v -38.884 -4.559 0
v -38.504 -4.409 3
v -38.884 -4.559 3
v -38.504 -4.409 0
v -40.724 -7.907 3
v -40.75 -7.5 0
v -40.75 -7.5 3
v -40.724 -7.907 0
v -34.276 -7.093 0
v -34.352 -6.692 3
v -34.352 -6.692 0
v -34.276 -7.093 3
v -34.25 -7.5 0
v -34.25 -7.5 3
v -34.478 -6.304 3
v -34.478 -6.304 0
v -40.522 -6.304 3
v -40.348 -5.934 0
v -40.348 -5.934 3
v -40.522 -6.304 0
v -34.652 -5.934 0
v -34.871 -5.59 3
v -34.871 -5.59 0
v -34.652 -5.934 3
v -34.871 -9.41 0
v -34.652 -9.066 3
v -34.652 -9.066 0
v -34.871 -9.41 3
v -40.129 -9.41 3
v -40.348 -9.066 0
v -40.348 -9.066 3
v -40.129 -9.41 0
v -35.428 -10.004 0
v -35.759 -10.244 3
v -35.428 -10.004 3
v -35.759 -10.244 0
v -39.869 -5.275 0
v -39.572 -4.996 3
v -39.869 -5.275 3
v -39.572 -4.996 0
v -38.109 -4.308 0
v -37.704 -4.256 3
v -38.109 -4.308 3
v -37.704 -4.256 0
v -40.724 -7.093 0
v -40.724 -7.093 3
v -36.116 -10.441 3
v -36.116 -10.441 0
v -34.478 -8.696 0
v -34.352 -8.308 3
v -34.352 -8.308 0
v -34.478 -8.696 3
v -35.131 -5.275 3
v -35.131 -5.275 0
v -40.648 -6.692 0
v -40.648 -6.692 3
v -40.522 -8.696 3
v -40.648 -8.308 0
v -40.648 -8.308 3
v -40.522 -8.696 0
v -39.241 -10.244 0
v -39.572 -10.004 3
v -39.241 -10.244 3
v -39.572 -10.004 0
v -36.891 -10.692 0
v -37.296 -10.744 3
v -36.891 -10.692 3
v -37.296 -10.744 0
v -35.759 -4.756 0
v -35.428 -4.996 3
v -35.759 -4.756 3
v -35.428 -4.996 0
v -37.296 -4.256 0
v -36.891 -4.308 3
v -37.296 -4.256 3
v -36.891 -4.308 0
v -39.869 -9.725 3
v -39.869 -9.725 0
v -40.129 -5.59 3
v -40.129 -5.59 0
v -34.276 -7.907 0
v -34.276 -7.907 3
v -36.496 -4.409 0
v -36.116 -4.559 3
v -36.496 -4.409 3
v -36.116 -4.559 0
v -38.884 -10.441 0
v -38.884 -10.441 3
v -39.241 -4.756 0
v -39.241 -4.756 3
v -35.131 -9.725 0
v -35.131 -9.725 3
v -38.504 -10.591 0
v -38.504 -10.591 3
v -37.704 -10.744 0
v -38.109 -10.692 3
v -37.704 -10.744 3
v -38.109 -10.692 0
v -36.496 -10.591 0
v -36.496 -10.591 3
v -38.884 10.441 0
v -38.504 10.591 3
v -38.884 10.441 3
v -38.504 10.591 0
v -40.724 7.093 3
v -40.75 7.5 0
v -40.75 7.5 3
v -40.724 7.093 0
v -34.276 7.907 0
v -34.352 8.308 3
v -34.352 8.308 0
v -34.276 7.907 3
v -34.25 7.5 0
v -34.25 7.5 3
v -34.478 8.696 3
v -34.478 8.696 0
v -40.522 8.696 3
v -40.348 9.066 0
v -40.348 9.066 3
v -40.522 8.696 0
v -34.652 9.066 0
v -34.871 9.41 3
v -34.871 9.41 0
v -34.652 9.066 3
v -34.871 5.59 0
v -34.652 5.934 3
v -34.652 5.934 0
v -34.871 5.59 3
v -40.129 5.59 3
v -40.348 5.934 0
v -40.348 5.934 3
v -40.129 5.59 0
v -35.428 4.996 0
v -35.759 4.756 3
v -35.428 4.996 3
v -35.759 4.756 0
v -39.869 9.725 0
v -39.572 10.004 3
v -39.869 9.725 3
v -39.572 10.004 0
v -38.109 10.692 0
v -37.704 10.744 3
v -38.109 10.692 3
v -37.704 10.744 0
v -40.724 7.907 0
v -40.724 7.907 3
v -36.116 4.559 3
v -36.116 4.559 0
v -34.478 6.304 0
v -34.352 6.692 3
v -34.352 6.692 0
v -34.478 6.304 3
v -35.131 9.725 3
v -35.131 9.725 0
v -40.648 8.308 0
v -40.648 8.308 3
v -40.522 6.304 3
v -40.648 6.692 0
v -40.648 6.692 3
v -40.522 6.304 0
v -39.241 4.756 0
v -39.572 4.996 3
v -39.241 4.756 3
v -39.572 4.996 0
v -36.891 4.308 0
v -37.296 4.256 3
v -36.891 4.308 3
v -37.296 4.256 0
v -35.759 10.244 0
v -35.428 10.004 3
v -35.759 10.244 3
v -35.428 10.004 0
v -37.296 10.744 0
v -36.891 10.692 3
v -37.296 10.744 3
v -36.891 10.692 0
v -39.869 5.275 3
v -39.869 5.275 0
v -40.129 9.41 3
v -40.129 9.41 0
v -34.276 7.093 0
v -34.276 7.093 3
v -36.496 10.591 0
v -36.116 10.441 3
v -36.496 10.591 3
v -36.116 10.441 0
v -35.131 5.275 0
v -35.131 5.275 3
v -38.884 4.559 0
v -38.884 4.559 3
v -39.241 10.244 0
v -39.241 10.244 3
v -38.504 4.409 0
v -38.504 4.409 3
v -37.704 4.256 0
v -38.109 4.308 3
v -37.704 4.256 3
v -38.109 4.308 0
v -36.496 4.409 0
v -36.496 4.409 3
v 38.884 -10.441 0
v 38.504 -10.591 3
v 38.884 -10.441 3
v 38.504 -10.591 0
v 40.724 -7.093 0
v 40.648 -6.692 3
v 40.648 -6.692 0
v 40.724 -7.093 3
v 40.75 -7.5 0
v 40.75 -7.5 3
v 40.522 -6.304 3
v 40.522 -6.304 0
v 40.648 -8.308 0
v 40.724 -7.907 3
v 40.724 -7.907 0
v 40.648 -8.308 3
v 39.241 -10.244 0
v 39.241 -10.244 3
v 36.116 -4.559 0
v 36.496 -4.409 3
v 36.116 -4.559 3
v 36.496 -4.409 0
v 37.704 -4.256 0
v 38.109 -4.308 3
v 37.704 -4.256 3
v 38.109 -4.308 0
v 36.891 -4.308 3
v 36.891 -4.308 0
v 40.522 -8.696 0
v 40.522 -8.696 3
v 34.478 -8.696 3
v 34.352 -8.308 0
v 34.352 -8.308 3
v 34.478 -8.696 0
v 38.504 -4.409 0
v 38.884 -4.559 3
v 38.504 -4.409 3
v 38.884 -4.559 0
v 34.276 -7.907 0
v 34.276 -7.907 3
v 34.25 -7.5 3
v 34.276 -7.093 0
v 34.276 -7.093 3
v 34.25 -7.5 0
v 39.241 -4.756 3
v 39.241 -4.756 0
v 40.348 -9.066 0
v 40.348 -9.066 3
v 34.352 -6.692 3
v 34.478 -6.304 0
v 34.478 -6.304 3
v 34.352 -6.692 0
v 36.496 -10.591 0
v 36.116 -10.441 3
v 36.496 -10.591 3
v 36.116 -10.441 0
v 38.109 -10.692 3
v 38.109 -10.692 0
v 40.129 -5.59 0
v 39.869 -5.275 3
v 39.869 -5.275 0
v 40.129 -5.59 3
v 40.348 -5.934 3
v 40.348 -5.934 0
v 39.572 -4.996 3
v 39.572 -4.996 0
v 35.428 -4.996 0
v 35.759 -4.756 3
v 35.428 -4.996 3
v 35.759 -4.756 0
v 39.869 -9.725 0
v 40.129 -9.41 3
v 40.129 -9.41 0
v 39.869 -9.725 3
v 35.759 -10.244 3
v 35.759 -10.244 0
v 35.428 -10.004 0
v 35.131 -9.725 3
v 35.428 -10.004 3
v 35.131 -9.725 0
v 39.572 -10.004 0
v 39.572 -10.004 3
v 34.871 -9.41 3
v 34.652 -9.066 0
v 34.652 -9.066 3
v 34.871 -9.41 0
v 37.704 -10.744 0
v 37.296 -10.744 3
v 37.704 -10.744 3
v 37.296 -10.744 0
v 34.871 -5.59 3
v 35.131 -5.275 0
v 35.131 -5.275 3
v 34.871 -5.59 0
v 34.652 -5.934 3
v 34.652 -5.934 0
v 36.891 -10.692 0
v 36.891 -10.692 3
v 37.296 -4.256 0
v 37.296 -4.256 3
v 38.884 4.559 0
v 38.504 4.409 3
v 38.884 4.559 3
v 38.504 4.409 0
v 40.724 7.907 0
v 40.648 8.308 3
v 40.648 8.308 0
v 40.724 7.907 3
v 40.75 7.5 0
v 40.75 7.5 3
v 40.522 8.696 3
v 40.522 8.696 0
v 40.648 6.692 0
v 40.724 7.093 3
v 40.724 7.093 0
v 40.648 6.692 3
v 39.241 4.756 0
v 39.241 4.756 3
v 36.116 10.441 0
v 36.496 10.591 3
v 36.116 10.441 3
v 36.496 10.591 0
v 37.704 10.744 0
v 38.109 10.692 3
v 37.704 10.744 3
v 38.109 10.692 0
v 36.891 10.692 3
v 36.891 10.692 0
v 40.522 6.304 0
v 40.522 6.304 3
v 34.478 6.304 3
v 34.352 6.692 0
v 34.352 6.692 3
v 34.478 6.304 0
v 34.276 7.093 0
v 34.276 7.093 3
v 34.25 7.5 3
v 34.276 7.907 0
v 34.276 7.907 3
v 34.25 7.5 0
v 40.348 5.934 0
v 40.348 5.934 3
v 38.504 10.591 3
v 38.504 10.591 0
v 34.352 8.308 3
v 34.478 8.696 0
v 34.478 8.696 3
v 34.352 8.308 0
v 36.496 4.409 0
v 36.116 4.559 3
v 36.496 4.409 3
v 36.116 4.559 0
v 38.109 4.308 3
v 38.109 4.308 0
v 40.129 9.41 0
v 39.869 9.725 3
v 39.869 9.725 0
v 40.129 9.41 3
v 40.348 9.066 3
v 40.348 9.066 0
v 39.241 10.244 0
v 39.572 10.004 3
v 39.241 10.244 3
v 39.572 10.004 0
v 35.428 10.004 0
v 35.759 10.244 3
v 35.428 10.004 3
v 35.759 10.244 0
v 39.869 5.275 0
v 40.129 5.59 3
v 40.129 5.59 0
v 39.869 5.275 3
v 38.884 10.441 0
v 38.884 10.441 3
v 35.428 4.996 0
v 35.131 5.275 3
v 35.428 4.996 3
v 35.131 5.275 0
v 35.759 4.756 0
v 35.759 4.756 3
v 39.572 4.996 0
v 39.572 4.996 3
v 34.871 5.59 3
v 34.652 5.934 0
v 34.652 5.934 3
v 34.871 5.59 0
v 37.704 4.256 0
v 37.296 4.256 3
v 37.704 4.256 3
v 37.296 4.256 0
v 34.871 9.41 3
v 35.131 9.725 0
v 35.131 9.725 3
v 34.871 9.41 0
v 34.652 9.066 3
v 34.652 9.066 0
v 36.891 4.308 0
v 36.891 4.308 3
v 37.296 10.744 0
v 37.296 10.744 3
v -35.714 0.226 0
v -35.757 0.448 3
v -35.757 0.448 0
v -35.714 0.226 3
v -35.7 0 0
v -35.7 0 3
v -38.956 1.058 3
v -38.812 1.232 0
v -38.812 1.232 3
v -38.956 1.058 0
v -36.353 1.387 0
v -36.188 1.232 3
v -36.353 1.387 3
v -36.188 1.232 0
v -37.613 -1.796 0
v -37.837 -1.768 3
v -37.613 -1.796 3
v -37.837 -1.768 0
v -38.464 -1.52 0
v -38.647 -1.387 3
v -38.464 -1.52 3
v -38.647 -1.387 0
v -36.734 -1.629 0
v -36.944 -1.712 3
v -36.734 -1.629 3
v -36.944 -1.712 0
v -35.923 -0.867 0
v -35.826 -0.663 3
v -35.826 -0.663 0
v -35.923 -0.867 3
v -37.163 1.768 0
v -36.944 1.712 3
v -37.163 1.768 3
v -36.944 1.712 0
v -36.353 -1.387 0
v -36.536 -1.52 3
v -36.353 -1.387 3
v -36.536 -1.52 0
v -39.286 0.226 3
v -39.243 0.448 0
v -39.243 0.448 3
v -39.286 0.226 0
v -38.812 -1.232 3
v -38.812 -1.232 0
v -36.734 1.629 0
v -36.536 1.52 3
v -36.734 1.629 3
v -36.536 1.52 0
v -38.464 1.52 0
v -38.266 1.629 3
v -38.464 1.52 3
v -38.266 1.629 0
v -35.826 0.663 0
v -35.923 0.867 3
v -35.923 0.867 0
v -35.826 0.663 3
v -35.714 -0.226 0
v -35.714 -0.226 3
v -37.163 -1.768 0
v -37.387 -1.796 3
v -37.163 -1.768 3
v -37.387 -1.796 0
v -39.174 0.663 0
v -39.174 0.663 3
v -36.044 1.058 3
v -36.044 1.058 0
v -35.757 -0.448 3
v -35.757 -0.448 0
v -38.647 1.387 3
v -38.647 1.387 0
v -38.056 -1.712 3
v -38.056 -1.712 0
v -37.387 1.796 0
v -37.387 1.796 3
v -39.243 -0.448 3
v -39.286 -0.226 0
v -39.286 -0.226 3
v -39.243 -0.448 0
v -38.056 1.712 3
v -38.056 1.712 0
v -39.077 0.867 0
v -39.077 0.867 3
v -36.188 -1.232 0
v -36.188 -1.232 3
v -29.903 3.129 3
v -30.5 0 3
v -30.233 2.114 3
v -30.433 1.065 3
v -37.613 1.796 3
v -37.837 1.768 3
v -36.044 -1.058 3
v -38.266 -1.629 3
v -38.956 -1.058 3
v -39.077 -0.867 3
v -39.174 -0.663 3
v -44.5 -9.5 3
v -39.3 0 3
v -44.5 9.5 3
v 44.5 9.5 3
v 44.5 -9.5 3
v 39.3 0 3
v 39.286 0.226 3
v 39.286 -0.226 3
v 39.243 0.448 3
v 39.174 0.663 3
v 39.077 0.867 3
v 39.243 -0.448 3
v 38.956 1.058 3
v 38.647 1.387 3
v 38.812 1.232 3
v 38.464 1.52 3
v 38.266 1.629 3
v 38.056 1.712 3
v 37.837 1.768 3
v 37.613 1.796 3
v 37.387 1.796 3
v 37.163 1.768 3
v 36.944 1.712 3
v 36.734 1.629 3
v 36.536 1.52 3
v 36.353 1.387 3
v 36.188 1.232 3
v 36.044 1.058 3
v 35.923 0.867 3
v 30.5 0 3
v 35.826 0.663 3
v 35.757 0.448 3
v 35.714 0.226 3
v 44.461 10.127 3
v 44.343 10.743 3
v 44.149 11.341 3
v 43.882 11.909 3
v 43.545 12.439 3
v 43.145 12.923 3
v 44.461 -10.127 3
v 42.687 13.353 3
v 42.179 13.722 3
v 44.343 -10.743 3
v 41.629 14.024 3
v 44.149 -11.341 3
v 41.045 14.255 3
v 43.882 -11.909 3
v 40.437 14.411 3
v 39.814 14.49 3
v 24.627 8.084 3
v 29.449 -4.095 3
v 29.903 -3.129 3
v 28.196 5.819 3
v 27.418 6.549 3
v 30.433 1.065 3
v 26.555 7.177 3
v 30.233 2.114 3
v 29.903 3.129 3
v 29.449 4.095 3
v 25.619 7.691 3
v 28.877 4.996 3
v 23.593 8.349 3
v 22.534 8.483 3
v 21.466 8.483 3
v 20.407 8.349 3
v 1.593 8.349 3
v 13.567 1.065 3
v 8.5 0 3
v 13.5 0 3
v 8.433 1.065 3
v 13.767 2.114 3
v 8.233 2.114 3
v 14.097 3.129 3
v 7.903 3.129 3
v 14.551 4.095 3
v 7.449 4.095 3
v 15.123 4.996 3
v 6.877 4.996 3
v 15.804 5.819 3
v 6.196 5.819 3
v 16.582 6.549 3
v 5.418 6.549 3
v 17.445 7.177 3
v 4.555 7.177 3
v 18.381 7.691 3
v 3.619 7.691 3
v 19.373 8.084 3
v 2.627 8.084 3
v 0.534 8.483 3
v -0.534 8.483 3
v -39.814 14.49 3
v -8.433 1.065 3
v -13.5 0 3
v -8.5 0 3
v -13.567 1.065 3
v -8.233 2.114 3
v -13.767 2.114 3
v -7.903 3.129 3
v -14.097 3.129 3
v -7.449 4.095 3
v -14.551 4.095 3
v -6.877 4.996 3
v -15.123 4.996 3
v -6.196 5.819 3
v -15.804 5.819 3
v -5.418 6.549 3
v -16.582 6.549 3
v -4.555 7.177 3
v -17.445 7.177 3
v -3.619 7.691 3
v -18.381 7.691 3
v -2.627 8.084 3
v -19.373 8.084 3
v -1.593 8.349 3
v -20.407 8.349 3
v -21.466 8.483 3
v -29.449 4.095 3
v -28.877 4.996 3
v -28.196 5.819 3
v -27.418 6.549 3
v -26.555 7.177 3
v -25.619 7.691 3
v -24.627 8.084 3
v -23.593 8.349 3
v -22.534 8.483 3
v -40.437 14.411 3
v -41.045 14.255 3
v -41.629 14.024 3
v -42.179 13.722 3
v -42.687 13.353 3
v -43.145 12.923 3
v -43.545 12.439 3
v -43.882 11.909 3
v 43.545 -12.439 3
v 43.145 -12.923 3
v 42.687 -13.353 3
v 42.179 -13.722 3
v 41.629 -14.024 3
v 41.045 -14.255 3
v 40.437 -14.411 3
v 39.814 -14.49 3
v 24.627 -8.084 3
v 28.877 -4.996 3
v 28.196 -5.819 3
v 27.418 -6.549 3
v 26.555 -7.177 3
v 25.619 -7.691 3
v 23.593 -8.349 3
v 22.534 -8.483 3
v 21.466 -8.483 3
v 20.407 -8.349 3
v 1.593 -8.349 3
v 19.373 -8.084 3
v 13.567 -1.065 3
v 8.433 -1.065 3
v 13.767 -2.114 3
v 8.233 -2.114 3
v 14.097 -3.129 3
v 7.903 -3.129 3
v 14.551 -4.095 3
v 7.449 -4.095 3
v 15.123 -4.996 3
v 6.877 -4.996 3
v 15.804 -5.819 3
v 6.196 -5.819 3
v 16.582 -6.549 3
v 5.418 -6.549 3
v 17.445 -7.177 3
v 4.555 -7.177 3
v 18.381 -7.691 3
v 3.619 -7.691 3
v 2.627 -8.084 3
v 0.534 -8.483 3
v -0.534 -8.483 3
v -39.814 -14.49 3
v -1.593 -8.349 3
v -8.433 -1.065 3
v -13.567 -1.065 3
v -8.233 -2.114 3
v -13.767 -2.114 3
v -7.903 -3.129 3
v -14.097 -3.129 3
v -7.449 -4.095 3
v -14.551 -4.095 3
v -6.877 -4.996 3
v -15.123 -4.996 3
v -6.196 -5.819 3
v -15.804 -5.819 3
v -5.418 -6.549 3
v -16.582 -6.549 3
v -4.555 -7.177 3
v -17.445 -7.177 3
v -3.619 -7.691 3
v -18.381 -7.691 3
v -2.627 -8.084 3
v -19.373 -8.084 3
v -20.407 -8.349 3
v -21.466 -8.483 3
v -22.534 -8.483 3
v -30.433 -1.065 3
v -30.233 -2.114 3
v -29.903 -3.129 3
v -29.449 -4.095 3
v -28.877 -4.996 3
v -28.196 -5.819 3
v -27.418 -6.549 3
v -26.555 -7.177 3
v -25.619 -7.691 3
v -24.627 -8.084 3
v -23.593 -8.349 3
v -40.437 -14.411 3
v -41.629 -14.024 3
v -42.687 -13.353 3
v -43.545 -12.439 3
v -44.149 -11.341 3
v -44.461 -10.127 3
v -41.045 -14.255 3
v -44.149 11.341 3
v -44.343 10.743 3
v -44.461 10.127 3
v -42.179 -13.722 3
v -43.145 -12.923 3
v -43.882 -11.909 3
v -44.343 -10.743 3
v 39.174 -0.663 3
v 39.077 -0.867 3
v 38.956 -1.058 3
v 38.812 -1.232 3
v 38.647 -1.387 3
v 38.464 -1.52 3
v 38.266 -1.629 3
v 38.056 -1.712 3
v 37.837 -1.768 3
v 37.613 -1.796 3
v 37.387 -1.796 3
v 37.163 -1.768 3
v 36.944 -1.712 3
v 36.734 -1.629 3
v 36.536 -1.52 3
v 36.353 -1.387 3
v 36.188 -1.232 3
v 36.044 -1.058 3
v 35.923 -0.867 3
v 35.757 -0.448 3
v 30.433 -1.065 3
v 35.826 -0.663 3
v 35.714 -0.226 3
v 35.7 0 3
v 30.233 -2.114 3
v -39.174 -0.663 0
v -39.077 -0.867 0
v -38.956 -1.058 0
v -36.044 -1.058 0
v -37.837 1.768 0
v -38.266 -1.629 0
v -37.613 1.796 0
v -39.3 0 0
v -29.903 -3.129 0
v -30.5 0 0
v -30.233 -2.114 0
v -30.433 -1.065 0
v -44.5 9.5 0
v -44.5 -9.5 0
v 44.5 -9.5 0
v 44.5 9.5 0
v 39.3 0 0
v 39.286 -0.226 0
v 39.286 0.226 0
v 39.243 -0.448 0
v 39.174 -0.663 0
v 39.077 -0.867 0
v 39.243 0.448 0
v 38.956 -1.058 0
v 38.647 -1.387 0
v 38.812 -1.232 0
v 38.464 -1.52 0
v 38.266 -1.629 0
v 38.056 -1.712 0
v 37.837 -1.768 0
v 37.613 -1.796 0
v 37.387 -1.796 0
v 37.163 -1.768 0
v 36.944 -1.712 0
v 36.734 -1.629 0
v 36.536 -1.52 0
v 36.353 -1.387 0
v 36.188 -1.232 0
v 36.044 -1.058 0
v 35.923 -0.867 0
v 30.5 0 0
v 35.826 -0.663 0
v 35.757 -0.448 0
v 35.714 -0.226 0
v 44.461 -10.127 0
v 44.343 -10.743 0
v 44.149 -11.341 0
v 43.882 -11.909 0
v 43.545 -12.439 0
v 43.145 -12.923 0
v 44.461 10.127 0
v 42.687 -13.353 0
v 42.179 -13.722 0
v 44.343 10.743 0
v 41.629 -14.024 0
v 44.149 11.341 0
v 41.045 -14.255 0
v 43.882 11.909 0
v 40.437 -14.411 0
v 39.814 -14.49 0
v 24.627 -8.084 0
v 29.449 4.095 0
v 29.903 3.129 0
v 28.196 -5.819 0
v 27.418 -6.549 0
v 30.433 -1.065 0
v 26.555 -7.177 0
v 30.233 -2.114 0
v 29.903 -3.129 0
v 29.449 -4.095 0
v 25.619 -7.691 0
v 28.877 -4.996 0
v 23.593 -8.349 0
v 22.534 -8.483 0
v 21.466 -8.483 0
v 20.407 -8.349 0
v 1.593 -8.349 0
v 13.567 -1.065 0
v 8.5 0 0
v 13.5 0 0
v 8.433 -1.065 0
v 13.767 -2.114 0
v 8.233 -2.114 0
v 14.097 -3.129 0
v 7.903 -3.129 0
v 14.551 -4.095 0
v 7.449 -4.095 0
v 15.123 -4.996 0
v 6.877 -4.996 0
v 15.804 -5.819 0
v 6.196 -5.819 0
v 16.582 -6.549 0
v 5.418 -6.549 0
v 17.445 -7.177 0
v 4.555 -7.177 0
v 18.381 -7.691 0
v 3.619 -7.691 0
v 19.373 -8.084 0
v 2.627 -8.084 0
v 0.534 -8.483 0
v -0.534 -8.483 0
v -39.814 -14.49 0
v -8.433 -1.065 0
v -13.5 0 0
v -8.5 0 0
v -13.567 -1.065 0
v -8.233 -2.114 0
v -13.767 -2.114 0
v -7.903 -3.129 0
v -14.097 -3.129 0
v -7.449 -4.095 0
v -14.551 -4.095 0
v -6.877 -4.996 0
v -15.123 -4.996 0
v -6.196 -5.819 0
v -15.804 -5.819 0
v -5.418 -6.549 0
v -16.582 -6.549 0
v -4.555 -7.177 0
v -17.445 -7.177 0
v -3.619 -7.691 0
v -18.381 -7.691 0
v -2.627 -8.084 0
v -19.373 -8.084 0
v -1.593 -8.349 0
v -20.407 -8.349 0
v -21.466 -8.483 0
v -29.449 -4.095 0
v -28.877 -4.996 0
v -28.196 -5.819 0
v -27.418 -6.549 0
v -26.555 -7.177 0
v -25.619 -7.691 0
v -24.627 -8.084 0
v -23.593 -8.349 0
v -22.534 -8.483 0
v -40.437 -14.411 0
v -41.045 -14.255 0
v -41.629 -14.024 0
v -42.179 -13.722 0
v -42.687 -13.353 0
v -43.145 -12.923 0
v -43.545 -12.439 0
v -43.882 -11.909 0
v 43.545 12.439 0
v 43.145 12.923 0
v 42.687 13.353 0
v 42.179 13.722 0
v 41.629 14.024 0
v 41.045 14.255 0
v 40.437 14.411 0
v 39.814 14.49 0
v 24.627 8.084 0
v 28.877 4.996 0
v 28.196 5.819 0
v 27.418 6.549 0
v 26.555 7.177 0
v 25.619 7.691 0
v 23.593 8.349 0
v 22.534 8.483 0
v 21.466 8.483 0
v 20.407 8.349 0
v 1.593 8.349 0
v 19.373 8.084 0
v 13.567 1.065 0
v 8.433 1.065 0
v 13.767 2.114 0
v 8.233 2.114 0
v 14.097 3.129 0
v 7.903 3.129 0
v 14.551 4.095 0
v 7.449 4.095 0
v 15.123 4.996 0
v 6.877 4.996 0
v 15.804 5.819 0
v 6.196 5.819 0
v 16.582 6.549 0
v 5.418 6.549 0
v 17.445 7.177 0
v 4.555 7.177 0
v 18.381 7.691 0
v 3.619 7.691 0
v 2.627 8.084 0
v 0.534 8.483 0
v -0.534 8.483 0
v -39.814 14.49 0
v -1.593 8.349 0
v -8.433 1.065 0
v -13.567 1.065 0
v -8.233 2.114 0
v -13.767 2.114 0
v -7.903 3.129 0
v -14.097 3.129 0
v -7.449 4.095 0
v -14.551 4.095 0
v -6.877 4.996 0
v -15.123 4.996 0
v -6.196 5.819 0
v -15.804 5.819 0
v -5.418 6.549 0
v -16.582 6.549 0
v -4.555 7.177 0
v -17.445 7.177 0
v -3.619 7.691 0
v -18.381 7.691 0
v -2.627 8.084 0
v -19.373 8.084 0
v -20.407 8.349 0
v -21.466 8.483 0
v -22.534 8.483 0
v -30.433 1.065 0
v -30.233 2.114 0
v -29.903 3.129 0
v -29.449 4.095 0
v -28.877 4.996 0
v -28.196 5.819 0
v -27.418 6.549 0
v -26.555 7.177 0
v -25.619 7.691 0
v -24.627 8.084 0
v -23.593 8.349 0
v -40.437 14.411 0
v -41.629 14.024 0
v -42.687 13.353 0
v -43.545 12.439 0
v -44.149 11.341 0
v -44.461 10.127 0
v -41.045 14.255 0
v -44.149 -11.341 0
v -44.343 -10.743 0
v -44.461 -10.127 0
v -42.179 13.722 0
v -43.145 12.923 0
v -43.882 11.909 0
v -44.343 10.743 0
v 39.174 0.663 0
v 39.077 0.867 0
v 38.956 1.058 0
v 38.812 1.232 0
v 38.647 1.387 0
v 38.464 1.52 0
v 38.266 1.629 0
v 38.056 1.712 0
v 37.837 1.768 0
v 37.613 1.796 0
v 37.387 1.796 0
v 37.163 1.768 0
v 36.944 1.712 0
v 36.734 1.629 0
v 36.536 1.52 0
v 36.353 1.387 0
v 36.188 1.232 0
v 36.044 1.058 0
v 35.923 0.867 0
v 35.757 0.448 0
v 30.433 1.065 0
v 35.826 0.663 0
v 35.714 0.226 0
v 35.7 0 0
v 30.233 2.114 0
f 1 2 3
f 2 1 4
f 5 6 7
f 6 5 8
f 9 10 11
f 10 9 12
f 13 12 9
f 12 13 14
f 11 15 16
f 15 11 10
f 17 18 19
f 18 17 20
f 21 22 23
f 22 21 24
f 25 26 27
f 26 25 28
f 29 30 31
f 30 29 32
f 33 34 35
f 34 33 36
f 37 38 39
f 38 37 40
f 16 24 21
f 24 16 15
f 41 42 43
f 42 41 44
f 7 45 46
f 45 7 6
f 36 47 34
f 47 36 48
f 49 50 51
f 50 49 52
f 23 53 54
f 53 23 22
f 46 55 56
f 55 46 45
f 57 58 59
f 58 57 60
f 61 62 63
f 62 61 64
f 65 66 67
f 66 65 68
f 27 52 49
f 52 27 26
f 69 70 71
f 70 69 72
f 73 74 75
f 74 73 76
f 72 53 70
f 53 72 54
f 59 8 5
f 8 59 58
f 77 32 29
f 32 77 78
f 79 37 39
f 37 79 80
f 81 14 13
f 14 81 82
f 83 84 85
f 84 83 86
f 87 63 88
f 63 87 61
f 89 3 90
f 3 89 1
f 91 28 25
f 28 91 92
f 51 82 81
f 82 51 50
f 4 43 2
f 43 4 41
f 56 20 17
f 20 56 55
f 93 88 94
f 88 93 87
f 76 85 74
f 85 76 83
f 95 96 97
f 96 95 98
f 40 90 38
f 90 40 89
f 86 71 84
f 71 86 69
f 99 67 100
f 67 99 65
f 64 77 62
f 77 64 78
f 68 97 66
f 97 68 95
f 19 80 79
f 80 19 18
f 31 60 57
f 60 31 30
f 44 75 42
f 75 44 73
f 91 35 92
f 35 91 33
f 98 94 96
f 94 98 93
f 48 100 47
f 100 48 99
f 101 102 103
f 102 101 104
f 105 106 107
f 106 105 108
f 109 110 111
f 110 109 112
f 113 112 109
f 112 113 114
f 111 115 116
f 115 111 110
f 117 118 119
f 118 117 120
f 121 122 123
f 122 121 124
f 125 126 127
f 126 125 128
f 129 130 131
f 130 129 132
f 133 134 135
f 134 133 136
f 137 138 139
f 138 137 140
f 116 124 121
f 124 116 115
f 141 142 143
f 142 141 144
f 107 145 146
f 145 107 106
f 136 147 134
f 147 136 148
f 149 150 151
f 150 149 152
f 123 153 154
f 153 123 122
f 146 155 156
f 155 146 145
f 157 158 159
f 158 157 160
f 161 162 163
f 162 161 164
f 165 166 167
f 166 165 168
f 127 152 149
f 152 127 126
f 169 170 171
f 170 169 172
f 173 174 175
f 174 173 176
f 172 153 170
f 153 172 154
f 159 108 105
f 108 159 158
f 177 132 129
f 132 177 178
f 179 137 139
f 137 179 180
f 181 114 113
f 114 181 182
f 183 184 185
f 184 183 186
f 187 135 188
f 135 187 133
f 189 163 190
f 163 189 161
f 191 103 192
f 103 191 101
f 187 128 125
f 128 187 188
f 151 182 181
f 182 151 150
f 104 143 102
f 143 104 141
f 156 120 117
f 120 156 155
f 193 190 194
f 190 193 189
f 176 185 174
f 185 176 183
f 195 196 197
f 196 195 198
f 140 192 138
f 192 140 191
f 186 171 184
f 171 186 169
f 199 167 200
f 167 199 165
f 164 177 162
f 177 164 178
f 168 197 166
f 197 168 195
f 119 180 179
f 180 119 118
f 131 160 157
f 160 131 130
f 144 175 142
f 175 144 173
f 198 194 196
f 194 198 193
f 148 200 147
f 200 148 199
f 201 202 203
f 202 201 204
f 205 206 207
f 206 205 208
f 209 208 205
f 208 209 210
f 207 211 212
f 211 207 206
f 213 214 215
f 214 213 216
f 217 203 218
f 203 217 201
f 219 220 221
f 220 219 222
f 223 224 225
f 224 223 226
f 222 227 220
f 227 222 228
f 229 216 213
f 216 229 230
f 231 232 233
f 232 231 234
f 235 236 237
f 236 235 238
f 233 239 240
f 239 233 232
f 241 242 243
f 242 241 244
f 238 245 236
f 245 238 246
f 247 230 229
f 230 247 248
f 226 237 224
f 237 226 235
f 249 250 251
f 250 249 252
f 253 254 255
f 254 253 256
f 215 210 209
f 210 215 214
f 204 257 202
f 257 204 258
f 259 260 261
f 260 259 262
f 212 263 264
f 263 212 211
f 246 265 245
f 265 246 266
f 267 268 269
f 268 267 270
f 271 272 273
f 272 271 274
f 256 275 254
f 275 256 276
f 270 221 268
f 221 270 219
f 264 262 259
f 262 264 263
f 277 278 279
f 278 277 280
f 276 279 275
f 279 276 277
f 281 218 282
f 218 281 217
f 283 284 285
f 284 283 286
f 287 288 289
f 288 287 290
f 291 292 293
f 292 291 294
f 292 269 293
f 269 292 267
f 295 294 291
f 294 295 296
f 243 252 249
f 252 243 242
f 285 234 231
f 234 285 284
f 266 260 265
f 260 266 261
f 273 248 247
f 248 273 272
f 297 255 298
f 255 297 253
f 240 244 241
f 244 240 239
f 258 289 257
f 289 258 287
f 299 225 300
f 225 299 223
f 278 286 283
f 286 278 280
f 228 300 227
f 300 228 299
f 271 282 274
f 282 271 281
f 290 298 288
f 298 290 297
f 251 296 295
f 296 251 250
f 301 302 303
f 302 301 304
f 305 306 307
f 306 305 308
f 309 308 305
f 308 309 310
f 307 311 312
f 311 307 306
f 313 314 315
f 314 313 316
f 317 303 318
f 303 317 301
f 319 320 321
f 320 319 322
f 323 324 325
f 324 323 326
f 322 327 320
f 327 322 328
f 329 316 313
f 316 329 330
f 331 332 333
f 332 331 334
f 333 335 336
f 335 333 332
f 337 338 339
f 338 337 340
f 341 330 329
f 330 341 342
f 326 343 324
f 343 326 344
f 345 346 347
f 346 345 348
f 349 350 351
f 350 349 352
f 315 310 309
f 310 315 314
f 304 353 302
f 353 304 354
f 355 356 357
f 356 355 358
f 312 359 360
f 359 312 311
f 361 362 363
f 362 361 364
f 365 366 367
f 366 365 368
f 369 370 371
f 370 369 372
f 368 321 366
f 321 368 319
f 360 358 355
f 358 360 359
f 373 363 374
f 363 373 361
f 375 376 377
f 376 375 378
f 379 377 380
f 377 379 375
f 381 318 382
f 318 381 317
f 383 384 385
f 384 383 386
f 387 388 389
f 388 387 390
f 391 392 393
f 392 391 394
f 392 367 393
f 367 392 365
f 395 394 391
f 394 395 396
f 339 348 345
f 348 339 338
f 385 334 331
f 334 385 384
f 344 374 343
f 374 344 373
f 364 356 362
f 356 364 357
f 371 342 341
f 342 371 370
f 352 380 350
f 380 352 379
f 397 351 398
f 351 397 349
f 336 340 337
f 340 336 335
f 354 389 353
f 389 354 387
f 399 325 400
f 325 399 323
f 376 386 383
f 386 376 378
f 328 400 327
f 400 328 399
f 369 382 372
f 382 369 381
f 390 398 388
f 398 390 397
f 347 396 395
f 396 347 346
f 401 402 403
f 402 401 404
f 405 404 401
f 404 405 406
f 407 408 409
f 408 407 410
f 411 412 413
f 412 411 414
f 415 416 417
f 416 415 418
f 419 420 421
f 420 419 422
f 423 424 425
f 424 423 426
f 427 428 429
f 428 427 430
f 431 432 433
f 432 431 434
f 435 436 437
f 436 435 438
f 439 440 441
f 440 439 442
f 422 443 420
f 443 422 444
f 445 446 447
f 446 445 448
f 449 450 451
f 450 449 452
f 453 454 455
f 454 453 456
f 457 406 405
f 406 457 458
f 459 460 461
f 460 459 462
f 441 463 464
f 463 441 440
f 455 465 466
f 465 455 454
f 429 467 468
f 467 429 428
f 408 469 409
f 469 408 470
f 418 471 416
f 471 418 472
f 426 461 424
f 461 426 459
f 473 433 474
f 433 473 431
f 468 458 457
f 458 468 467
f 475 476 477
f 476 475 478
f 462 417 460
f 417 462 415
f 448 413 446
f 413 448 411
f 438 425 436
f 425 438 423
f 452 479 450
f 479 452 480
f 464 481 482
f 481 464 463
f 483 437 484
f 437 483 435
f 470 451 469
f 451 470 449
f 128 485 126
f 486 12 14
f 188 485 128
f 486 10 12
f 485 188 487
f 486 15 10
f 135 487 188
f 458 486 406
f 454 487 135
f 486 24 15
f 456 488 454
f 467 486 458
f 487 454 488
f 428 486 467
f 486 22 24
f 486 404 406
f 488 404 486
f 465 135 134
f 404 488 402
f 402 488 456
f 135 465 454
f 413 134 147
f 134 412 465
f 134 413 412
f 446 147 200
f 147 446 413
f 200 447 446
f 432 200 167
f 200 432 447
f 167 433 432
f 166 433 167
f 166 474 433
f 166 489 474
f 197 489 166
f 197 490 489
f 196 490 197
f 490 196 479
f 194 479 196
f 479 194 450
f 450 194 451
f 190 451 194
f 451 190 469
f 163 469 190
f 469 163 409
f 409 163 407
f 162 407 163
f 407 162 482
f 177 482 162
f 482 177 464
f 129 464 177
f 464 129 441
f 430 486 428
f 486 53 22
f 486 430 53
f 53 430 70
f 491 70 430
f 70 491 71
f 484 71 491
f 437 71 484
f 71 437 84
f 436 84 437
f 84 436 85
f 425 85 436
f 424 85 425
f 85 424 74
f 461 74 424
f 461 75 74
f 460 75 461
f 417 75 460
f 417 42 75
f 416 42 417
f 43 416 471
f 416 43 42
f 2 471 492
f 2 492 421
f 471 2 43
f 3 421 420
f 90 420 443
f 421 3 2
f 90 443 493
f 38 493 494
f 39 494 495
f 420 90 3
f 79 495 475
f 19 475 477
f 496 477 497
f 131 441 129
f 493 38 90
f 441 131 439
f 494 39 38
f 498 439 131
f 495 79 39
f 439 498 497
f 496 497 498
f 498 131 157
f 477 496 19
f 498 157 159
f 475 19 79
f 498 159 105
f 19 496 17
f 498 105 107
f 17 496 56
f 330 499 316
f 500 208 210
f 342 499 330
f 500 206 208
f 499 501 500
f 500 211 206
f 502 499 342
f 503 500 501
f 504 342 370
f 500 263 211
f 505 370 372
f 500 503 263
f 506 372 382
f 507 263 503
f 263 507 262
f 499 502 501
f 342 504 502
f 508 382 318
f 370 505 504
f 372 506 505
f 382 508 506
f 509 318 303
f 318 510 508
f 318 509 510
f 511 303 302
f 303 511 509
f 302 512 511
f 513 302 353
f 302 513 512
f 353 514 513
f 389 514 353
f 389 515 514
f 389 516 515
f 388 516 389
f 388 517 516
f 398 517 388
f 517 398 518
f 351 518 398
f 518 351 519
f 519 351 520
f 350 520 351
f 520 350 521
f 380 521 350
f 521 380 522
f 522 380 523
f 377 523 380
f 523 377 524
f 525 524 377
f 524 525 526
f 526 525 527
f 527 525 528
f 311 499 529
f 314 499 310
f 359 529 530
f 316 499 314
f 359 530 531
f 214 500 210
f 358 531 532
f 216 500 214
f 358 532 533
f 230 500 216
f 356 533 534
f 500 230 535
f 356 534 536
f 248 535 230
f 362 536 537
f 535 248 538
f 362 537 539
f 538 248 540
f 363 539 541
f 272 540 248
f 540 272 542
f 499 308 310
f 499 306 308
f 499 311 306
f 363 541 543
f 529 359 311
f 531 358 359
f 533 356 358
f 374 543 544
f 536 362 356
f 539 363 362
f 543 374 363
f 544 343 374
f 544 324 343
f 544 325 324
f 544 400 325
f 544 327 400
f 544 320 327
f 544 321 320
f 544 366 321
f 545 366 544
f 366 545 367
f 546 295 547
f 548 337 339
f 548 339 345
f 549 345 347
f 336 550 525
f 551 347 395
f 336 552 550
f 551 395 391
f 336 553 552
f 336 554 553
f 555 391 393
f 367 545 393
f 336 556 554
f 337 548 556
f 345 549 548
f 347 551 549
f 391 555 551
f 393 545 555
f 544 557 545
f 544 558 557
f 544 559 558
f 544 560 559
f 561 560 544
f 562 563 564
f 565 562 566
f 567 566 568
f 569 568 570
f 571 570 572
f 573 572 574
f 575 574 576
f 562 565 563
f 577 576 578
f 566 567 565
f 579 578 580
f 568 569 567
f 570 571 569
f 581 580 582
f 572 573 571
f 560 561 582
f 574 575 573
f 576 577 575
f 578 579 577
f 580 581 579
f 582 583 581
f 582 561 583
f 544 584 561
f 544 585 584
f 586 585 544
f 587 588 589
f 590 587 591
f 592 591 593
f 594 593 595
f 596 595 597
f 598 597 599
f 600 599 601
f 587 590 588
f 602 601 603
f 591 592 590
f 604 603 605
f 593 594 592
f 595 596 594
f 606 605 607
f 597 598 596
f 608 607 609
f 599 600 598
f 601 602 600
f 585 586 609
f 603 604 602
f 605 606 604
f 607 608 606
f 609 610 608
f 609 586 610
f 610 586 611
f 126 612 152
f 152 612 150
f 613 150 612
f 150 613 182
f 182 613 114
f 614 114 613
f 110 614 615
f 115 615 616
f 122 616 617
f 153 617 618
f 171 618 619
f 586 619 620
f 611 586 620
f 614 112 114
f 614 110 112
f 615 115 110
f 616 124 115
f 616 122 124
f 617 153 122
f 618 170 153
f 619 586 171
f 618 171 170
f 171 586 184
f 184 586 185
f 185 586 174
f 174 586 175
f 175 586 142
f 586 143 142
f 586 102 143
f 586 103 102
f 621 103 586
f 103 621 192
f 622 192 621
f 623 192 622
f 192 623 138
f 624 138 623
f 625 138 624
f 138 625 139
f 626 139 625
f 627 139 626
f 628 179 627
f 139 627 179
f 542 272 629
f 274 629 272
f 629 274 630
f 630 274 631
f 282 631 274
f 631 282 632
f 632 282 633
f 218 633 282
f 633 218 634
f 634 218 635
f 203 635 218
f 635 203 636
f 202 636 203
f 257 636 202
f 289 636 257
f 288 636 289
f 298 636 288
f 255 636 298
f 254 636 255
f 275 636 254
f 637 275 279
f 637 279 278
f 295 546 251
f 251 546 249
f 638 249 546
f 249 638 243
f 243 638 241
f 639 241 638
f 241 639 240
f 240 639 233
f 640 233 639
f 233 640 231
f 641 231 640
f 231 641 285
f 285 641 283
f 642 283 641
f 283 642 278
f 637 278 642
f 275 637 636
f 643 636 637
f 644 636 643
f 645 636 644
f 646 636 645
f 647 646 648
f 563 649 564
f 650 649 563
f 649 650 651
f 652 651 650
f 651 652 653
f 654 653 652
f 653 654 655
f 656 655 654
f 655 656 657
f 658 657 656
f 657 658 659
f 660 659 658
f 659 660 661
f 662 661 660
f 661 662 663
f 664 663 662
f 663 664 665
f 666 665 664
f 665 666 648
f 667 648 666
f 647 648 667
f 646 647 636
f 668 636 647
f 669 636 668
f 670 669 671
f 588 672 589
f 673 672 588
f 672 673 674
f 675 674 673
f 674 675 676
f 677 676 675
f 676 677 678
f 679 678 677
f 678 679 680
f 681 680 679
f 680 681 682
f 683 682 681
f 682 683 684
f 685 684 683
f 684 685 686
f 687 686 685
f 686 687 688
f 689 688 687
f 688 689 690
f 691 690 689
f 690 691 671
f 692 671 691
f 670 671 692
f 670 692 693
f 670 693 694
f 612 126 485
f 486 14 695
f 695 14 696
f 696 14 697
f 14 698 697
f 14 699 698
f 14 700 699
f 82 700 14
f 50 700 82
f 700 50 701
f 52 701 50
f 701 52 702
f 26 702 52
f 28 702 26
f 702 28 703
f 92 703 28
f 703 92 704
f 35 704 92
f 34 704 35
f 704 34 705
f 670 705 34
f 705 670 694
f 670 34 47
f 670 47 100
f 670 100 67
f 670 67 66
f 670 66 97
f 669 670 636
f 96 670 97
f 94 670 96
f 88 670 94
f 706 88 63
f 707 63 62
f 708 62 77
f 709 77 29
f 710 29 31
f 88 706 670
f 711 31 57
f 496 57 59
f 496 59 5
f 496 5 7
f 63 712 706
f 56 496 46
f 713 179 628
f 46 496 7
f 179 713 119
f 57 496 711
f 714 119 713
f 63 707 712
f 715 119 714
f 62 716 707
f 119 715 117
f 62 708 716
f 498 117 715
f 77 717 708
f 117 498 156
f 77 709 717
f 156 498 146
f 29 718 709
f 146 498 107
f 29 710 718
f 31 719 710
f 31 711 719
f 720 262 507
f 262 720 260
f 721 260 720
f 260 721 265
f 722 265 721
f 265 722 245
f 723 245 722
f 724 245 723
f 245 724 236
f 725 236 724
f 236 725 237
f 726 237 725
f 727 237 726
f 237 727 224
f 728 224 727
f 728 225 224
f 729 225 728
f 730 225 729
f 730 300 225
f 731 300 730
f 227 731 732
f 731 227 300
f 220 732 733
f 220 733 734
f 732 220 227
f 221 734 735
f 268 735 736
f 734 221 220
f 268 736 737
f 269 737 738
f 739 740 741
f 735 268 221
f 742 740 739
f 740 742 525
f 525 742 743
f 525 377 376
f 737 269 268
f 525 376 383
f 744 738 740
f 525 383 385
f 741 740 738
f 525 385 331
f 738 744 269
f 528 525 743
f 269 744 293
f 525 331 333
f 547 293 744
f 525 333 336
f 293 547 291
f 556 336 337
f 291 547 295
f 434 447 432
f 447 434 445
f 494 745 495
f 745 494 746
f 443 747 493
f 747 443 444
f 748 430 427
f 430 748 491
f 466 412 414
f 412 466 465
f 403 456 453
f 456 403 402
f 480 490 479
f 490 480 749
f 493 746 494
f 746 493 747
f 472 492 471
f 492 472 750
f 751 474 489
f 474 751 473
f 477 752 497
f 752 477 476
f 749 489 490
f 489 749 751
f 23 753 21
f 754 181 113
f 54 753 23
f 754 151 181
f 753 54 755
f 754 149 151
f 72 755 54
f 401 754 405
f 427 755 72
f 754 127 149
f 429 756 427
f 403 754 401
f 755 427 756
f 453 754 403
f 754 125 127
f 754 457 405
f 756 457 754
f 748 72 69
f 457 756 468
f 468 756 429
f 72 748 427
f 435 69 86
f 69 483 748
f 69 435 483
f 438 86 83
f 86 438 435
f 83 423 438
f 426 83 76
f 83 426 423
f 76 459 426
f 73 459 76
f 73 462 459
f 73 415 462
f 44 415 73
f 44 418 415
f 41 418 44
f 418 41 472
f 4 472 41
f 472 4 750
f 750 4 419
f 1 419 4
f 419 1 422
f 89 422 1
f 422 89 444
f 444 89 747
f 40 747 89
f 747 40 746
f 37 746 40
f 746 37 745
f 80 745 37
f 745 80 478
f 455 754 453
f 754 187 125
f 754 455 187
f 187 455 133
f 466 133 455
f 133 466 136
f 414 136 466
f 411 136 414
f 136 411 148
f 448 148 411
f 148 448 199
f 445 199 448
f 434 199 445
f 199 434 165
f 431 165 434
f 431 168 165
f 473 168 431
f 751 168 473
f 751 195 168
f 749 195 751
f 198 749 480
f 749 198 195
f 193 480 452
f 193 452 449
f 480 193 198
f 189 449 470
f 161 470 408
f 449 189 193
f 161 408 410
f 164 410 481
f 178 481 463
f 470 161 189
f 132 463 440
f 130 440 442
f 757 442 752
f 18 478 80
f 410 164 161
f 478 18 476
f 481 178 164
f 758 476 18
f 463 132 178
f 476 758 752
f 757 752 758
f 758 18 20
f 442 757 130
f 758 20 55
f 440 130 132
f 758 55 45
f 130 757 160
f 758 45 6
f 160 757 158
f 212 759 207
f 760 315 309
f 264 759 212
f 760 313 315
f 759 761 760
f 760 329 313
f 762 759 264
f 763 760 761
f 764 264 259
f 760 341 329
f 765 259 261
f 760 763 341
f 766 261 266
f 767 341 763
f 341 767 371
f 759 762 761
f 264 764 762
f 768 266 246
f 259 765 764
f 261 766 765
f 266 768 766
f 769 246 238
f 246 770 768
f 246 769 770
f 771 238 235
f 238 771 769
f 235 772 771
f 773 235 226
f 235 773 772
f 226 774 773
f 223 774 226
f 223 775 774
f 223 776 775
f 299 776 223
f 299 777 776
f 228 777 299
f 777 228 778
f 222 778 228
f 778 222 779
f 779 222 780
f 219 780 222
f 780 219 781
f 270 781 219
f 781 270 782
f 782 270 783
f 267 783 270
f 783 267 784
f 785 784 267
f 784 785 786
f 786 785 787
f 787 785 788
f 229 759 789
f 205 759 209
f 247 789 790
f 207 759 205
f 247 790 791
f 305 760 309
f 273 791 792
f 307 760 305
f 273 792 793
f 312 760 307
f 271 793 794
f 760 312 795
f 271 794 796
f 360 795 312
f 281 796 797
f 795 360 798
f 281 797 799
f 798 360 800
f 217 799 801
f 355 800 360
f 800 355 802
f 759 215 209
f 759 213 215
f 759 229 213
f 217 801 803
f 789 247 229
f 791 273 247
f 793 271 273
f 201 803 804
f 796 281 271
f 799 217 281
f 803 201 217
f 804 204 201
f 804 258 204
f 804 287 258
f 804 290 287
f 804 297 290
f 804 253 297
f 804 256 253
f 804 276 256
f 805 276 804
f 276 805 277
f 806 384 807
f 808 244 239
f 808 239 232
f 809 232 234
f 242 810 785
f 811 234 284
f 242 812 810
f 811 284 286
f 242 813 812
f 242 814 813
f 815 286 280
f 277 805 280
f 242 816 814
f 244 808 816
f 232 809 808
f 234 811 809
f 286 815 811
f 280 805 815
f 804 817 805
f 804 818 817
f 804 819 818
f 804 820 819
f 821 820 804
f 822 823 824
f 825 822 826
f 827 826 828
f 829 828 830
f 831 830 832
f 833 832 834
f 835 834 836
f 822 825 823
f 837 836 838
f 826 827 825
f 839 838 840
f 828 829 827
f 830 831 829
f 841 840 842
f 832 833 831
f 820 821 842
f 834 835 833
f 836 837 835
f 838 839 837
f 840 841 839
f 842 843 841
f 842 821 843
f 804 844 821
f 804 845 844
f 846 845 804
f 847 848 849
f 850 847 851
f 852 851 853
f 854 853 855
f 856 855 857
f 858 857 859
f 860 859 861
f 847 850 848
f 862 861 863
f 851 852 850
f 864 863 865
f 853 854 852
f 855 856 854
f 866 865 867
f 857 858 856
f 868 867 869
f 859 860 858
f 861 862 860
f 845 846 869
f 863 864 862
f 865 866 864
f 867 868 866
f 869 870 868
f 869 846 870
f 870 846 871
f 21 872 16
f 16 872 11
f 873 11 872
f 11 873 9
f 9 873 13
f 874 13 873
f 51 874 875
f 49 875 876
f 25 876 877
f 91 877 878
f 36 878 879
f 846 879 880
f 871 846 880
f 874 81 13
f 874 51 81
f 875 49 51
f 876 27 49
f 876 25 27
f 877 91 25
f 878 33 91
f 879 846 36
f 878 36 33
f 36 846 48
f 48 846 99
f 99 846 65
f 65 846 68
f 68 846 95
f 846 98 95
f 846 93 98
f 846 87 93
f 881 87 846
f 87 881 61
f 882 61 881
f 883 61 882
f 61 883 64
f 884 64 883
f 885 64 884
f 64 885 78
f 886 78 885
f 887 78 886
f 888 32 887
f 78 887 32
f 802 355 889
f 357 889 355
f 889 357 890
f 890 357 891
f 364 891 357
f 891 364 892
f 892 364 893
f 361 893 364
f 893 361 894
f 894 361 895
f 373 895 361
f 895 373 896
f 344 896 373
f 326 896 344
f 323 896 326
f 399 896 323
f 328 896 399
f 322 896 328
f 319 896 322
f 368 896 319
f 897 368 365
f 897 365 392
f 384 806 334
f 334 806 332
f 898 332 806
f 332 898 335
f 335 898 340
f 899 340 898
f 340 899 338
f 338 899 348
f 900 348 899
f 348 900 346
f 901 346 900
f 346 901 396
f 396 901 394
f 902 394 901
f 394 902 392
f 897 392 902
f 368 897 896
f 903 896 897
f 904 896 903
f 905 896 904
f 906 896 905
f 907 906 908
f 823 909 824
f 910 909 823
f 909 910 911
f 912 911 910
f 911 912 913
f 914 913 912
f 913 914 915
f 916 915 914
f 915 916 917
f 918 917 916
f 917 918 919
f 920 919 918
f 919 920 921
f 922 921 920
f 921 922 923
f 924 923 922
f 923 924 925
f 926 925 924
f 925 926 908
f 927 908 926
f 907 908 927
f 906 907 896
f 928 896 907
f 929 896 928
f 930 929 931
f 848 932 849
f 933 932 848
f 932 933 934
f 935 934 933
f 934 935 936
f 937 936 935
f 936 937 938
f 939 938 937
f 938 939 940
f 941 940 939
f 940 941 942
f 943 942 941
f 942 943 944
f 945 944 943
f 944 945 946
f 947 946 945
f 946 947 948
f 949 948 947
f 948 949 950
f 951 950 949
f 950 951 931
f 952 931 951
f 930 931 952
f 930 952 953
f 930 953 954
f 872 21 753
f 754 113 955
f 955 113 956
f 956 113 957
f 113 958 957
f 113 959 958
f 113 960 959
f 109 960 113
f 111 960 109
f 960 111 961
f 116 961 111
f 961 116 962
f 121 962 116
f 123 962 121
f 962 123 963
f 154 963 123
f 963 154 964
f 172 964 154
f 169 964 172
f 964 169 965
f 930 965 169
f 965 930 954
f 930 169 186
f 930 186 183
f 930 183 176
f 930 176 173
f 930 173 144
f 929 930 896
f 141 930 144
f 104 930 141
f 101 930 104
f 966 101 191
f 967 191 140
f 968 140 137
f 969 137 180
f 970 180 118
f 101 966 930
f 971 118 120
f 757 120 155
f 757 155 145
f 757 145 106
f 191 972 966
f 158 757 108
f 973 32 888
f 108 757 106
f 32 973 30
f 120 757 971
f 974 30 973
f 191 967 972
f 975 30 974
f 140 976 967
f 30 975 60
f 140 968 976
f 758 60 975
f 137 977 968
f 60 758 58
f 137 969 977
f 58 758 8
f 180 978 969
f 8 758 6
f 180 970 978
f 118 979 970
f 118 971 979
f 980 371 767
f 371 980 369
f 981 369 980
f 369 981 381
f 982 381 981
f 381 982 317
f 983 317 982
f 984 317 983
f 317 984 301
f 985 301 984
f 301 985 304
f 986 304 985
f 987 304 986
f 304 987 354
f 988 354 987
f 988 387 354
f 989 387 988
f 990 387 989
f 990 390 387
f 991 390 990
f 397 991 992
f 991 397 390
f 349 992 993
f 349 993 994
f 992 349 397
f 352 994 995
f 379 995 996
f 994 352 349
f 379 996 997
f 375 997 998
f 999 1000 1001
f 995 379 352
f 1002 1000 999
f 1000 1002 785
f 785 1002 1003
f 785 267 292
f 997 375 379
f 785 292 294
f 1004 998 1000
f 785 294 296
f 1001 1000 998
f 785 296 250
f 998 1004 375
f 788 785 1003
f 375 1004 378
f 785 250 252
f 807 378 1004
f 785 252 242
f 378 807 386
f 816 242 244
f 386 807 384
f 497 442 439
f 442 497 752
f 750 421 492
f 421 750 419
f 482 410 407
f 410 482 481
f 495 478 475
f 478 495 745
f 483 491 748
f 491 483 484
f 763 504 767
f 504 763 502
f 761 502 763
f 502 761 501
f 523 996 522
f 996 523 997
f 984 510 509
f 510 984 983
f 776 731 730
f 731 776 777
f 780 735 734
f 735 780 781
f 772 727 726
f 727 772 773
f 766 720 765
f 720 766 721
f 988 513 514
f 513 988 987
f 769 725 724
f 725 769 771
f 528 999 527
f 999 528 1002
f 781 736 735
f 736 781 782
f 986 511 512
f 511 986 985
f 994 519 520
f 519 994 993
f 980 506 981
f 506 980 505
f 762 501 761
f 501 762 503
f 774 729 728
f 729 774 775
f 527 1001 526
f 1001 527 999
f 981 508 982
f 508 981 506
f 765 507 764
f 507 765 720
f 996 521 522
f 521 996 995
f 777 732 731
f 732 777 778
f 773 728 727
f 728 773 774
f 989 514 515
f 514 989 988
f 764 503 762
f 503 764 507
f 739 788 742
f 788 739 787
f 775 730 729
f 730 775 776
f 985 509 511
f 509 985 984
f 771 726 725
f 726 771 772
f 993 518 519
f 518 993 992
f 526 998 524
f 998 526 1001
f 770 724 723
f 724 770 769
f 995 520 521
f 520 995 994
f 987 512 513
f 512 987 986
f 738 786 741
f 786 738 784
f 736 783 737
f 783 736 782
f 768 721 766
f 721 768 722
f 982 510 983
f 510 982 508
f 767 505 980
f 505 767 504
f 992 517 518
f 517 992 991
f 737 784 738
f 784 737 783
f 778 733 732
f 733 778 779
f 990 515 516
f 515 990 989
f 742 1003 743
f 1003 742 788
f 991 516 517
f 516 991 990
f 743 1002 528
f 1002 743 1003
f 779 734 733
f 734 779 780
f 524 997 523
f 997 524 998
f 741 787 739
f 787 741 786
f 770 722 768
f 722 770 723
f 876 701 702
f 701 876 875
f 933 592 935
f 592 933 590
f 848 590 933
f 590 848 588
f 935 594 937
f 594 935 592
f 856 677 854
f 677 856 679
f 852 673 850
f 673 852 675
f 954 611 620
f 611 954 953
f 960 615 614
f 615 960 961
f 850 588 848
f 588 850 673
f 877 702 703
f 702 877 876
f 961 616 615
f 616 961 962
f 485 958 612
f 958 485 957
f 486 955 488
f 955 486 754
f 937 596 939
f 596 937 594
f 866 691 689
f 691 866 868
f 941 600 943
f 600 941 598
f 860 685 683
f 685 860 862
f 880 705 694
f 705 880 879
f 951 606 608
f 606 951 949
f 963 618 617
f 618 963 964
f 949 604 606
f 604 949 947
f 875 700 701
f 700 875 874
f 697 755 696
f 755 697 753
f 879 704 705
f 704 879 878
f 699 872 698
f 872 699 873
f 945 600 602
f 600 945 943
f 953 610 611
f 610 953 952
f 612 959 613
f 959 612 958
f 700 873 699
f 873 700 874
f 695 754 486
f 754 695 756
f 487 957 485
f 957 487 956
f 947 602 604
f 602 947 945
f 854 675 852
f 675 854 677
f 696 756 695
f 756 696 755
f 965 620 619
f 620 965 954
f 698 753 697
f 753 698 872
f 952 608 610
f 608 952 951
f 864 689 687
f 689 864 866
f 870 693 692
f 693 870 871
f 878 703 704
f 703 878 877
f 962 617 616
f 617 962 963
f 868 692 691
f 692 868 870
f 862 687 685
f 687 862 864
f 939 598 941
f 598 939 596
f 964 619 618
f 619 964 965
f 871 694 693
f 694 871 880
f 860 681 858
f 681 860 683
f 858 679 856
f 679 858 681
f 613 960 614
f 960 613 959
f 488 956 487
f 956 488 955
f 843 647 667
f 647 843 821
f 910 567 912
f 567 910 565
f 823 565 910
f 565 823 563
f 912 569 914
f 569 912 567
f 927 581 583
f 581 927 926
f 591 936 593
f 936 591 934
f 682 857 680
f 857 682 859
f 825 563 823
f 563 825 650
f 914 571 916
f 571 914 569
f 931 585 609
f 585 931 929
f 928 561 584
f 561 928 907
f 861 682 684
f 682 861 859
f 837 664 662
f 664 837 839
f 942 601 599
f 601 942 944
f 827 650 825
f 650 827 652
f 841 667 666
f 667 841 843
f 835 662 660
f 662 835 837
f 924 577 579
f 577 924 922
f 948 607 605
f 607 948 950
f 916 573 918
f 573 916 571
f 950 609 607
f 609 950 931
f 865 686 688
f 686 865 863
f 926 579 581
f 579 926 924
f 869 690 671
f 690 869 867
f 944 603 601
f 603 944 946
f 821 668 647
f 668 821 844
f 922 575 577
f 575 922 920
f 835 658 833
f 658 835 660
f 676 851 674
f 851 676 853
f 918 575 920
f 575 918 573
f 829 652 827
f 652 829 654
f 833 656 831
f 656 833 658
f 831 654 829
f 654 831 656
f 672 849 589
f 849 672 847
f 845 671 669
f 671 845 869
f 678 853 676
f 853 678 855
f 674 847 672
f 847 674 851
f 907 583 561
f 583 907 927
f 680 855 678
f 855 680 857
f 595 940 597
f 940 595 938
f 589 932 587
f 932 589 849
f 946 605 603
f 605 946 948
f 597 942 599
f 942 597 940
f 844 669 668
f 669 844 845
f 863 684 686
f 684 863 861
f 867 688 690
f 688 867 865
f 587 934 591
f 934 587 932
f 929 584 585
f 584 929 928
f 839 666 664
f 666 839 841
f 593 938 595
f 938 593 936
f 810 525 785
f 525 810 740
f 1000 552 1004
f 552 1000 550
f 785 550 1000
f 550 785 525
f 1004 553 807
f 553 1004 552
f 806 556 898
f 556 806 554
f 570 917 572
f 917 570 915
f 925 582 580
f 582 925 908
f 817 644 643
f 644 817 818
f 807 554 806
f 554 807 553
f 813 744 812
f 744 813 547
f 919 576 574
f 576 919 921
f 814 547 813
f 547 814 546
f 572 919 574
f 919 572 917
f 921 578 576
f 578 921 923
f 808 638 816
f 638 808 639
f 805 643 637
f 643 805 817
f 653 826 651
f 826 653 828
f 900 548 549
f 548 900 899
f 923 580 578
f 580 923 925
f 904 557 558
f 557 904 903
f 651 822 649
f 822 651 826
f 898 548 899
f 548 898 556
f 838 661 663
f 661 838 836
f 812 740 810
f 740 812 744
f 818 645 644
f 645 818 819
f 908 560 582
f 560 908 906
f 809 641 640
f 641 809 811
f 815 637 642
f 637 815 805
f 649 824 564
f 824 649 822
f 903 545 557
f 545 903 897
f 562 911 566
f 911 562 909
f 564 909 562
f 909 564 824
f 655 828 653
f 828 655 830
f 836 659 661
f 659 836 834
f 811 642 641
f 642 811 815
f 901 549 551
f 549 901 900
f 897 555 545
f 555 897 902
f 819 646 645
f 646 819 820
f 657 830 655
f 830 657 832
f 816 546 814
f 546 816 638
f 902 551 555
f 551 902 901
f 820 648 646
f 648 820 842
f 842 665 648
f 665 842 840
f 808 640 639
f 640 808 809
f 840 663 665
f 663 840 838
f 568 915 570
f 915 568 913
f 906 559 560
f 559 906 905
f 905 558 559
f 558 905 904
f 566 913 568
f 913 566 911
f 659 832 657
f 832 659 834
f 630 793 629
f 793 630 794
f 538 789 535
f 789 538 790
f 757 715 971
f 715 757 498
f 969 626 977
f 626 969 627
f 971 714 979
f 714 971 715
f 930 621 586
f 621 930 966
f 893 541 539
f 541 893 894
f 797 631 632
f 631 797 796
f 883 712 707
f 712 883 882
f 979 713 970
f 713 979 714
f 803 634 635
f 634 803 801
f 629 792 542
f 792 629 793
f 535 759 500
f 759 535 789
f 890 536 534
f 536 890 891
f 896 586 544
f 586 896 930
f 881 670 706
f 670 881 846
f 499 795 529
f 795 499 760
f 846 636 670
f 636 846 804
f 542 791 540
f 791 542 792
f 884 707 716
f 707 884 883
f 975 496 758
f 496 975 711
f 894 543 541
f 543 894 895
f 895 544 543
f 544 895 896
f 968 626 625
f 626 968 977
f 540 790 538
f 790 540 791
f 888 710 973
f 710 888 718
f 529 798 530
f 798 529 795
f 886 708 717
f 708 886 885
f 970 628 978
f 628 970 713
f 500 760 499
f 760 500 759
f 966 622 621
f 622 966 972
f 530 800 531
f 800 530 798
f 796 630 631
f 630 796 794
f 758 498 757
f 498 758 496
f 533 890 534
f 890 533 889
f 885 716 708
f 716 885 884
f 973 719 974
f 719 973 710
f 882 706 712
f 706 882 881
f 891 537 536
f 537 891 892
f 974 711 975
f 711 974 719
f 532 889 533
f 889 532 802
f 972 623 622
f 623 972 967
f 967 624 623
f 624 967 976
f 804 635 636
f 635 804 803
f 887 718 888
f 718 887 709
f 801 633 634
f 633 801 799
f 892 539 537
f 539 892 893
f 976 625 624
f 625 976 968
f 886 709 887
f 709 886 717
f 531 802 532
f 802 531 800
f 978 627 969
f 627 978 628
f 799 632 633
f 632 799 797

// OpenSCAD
$fn = 50;


difference() {
	union() {
		hull() {
			translate(v = [-39.5000000000, 9.5000000000, 0]) {
				cylinder(h = 3, r = 5);
			}
			translate(v = [39.5000000000, 9.5000000000, 0]) {
				cylinder(h = 3, r = 5);
			}
			translate(v = [-39.5000000000, -9.5000000000, 0]) {
				cylinder(h = 3, r = 5);
			}
			translate(v = [39.5000000000, -9.5000000000, 0]) {
				cylinder(h = 3, r = 5);
			}
		}
	}
	union() {
		#translate(v = [-37.5000000000, -7.5000000000, 0]) {
			cylinder(h = 3, r = 3.2500000000);
		}
		#translate(v = [-37.5000000000, 7.5000000000, 0]) {
			cylinder(h = 3, r = 3.2500000000);
		}
		#translate(v = [37.5000000000, -7.5000000000, 0]) {
			cylinder(h = 3, r = 3.2500000000);
		}
		#translate(v = [37.5000000000, 7.5000000000, 0]) {
			cylinder(h = 3, r = 3.2500000000);
		}
		#translate(v = [-37.5000000000, -7.5000000000, -100.0000000000]) {
			cylinder(h = 200, r = 3.2500000000);
		}
		#translate(v = [-37.5000000000, 7.5000000000, -100.0000000000]) {
			cylinder(h = 200, r = 3.2500000000);
		}
		#translate(v = [37.5000000000, -7.5000000000, -100.0000000000]) {
			cylinder(h = 200, r = 3.2500000000);
		}
		#translate(v = [37.5000000000, 7.5000000000, -100.0000000000]) {
			cylinder(h = 200, r = 3.2500000000);
		}
		#translate(v = [-37.5000000000, -7.5000000000, 0]) {
			cylinder(h = 3, r = 1.8000000000);
		}
		#translate(v = [-37.5000000000, 0.0000000000, 0]) {
			cylinder(h = 3, r = 1.8000000000);
		}
		#translate(v = [-37.5000000000, 7.5000000000, 0]) {
			cylinder(h = 3, r = 1.8000000000);
		}
		#translate(v = [37.5000000000, -7.5000000000, 0]) {
			cylinder(h = 3, r = 1.8000000000);
		}
		#translate(v = [37.5000000000, 0.0000000000, 0]) {
			cylinder(h = 3, r = 1.8000000000);
		}
		#translate(v = [37.5000000000, 7.5000000000, 0]) {
			cylinder(h = 3, r = 1.8000000000);
		}
		#translate(v = [-37.5000000000, -7.5000000000, 0]) {
			cylinder(h = 3, r = 1.8000000000);
		}
		#translate(v = [-37.5000000000, 0.0000000000, 0]) {
			cylinder(h = 3, r = 1.8000000000);
		}
		#translate(v = [-37.5000000000, 7.5000000000, 0]) {
			cylinder(h = 3, r = 1.8000000000);
		}
		#translate(v = [37.5000000000, -7.5000000000, 0]) {
			cylinder(h = 3, r = 1.8000000000);
		}
		#translate(v = [37.5000000000, 0.0000000000, 0]) {
			cylinder(h = 3, r = 1.8000000000);
		}
		#translate(v = [37.5000000000, 7.5000000000, 0]) {
			cylinder(h = 3, r = 1.8000000000);
		}
		#translate(v = [-37.5000000000, -7.5000000000, 0]) {
			cylinder(h = 3, r = 1.8000000000);
		}
		#translate(v = [-37.5000000000, 0.0000000000, 0]) {
			cylinder(h = 3, r = 1.8000000000);
		}
		#translate(v = [-37.5000000000, 7.5000000000, 0]) {
			cylinder(h = 3, r = 1.8000000000);
		}
		#translate(v = [37.5000000000, -7.5000000000, 0]) {
			cylinder(h = 3, r = 1.8000000000);
		}
		#translate(v = [37.5000000000, 0.0000000000, 0]) {
			cylinder(h = 3, r = 1.8000000000);
		}
		#translate(v = [37.5000000000, 7.5000000000, 0]) {
			cylinder(h = 3, r = 1.8000000000);
		}
		#translate(v = [-22.0000000000, 0, 0]) {
			cylinder(h = 3, r = 8.5000000000);
		}
		#cylinder(h = 3, r = 8.5000000000);
		#translate(v = [22.0000000000, 0, 0]) {
			cylinder(h = 3, r = 8.5000000000);
		}
	}
}
